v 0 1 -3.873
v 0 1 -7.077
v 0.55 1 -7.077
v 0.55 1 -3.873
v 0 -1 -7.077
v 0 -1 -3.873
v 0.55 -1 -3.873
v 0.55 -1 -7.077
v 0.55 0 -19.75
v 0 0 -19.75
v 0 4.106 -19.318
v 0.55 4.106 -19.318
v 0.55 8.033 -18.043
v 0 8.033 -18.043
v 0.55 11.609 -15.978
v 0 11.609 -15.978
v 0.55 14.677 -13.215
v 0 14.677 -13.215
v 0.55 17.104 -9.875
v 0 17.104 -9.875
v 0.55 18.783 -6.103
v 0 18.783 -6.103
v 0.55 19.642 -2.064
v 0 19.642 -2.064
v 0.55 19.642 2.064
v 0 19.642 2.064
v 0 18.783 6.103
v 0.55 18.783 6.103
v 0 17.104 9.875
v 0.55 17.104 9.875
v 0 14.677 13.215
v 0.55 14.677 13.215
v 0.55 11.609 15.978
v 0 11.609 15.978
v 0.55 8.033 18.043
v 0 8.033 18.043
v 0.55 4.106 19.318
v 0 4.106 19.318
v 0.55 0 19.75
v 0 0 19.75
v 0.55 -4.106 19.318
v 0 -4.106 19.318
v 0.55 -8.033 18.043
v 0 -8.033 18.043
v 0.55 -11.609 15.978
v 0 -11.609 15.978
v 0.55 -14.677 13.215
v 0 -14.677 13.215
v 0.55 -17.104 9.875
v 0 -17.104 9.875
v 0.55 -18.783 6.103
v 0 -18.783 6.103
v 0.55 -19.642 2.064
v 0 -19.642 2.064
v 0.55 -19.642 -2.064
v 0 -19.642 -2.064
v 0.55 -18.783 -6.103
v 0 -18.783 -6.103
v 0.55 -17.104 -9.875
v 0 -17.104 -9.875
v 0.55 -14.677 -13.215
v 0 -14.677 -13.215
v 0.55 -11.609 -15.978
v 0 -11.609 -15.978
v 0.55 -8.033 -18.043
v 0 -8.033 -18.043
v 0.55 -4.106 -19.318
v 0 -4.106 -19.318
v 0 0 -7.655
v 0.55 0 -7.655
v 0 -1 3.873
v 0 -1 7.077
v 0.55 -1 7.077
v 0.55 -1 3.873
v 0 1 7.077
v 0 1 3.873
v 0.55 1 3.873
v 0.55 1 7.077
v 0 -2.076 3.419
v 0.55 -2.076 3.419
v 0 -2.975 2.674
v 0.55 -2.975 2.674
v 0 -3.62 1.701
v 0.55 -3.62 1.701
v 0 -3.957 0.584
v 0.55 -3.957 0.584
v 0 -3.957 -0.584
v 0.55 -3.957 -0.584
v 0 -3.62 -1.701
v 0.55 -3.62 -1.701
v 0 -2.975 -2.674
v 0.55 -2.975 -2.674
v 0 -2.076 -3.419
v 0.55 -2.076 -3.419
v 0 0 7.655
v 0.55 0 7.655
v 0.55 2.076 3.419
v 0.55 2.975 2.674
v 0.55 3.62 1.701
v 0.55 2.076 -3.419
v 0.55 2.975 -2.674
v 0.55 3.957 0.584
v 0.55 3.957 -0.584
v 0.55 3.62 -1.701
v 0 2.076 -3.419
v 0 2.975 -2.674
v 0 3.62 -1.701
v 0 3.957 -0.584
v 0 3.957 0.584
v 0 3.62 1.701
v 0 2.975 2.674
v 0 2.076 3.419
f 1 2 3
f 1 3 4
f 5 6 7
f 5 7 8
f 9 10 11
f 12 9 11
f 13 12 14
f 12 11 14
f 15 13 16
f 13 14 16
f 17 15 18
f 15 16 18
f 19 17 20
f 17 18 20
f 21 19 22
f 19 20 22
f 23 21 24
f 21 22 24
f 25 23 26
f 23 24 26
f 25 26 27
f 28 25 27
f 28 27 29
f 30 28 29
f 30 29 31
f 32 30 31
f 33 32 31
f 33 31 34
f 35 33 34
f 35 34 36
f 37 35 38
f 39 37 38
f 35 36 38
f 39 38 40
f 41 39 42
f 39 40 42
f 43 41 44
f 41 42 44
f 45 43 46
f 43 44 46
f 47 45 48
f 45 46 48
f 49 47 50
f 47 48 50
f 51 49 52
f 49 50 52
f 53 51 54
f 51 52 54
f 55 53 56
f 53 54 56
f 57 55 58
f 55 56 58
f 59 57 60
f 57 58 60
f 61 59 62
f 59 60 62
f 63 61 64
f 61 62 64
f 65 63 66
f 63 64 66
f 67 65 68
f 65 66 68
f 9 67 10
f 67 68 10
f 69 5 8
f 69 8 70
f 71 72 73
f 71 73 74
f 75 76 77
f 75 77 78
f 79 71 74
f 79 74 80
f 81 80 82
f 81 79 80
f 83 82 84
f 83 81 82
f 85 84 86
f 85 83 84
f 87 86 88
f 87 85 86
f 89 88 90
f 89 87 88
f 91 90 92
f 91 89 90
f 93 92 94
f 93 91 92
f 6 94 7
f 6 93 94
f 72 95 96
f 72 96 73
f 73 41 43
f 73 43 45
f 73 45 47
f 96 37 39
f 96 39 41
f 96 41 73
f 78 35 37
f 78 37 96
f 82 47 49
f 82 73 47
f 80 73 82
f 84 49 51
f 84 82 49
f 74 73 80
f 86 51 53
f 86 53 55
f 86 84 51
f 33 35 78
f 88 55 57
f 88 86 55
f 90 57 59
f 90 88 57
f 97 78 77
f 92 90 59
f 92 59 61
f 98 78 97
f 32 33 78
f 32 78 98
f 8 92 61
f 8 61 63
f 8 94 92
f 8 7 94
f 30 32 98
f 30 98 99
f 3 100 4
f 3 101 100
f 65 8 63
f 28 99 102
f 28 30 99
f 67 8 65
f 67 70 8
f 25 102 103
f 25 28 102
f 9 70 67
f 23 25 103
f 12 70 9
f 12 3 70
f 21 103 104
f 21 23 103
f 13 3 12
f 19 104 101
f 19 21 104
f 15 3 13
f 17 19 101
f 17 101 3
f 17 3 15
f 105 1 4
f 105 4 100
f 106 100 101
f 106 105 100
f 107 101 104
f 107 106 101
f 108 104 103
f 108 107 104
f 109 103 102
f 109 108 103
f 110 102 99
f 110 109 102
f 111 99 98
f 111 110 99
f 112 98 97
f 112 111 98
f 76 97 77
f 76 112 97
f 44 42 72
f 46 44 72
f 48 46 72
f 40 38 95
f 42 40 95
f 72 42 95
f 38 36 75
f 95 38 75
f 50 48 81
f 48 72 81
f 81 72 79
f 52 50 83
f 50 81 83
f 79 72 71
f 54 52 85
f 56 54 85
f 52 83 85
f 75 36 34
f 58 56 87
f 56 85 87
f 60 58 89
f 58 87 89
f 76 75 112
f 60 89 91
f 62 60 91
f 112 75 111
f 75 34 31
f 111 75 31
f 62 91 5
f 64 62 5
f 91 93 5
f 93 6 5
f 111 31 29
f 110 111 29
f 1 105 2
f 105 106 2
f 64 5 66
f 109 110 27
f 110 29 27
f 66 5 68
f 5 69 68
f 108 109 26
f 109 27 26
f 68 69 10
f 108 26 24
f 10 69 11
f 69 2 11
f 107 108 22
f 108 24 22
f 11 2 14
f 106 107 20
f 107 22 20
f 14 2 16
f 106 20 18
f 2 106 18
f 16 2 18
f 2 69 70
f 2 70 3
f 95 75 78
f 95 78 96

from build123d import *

# Parameters (mm, degrees)
SKETCH1_R           = 19.75
BOSS_EXTRUDE1_DEPTH = 0.55


with BuildPart() as part:
    # Sketch1 → Boss-Extrude1 (new body)
    with BuildSketch(Plane(origin=(0, 0, 0), x_dir=(0, 0, -1), z_dir=(1, 0, 0))):
        Circle(SKETCH1_R)
        with BuildLine():
            Line((5.922649731, 1), (3.872983346, 1))
            ThreePointArc((3.872983346, 1), (0, 4), (-3.872983346, 1))
            Line((-3.872983346, 1), (-5.922649731, 1))
            Line((-5.922649731, 1), (-7.077350269, 1))
            Line((-7.077350269, 1), (-7.654700538, 0))
            Line((-7.654700538, 0), (-7.077350269, -1))
            Line((-7.077350269, -1), (-5.922649731, -1))
            Line((-5.922649731, -1), (-3.872983346, -1))
            ThreePointArc((-3.872983346, -1), (0, -4), (3.872983346, -1))
            Line((3.872983346, -1), (5.922649731, -1))
            Line((5.922649731, -1), (6.5, -1))
            Line((6.5, -1), (7.077350269, -1))
            Line((7.077350269, -1), (7.654700538, 0))
            Line((7.654700538, 0), (7.077350269, 1))
            Line((7.077350269, 1), (6.5, 1))
            Line((6.5, 1), (5.922649731, 1))
        make_face(mode=Mode.SUBTRACT)
    extrude(amount=BOSS_EXTRUDE1_DEPTH)


solid = part.part
